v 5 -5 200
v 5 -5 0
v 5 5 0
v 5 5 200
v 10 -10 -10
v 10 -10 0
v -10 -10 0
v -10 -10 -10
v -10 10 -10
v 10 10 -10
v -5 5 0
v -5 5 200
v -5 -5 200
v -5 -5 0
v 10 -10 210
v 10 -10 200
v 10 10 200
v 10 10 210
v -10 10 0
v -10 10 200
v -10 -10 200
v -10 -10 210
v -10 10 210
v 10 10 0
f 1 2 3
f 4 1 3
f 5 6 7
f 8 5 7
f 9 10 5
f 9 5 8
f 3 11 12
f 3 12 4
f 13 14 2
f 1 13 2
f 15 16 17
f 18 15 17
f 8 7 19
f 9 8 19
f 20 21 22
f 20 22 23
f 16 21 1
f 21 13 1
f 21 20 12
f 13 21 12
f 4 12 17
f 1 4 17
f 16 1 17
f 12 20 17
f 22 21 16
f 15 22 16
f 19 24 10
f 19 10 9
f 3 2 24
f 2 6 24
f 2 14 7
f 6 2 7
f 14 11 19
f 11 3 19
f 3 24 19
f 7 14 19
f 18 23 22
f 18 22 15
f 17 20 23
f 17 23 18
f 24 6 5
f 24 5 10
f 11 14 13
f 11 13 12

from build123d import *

# Parameters (mm, degrees)
SKETCH_1_W      = 10
SKETCH_1_H      = 10
EXTRUDE_1_DEPTH = 200
SKETCH_2_W      = 20
SKETCH_2_H      = 20
EXTRUDE_2_DEPTH = 10
SKETCH_3_W      = 20
SKETCH_3_H      = 20
EXTRUDE_3_DEPTH = 10


with BuildPart() as part:
    # 草图1 → 凸台-拉伸1 (new body)
    with BuildSketch(Plane.XY):
        Rectangle(SKETCH_1_W, SKETCH_1_H)
    extrude(amount=EXTRUDE_1_DEPTH)

    # 草图2 → 凸台-拉伸2 (add)
    with BuildSketch(Plane.XY.offset(200)):
        Rectangle(SKETCH_2_W, SKETCH_2_H)
    extrude(amount=EXTRUDE_2_DEPTH)

    # 草图3 → 凸台-拉伸3 (add)
    with BuildSketch(Plane(origin=(0, 0, 0), x_dir=(-1, 0, 0), z_dir=(0, 0, -1))):
        Rectangle(SKETCH_3_W, SKETCH_3_H)
    extrude(amount=EXTRUDE_3_DEPTH)


solid = part.part
